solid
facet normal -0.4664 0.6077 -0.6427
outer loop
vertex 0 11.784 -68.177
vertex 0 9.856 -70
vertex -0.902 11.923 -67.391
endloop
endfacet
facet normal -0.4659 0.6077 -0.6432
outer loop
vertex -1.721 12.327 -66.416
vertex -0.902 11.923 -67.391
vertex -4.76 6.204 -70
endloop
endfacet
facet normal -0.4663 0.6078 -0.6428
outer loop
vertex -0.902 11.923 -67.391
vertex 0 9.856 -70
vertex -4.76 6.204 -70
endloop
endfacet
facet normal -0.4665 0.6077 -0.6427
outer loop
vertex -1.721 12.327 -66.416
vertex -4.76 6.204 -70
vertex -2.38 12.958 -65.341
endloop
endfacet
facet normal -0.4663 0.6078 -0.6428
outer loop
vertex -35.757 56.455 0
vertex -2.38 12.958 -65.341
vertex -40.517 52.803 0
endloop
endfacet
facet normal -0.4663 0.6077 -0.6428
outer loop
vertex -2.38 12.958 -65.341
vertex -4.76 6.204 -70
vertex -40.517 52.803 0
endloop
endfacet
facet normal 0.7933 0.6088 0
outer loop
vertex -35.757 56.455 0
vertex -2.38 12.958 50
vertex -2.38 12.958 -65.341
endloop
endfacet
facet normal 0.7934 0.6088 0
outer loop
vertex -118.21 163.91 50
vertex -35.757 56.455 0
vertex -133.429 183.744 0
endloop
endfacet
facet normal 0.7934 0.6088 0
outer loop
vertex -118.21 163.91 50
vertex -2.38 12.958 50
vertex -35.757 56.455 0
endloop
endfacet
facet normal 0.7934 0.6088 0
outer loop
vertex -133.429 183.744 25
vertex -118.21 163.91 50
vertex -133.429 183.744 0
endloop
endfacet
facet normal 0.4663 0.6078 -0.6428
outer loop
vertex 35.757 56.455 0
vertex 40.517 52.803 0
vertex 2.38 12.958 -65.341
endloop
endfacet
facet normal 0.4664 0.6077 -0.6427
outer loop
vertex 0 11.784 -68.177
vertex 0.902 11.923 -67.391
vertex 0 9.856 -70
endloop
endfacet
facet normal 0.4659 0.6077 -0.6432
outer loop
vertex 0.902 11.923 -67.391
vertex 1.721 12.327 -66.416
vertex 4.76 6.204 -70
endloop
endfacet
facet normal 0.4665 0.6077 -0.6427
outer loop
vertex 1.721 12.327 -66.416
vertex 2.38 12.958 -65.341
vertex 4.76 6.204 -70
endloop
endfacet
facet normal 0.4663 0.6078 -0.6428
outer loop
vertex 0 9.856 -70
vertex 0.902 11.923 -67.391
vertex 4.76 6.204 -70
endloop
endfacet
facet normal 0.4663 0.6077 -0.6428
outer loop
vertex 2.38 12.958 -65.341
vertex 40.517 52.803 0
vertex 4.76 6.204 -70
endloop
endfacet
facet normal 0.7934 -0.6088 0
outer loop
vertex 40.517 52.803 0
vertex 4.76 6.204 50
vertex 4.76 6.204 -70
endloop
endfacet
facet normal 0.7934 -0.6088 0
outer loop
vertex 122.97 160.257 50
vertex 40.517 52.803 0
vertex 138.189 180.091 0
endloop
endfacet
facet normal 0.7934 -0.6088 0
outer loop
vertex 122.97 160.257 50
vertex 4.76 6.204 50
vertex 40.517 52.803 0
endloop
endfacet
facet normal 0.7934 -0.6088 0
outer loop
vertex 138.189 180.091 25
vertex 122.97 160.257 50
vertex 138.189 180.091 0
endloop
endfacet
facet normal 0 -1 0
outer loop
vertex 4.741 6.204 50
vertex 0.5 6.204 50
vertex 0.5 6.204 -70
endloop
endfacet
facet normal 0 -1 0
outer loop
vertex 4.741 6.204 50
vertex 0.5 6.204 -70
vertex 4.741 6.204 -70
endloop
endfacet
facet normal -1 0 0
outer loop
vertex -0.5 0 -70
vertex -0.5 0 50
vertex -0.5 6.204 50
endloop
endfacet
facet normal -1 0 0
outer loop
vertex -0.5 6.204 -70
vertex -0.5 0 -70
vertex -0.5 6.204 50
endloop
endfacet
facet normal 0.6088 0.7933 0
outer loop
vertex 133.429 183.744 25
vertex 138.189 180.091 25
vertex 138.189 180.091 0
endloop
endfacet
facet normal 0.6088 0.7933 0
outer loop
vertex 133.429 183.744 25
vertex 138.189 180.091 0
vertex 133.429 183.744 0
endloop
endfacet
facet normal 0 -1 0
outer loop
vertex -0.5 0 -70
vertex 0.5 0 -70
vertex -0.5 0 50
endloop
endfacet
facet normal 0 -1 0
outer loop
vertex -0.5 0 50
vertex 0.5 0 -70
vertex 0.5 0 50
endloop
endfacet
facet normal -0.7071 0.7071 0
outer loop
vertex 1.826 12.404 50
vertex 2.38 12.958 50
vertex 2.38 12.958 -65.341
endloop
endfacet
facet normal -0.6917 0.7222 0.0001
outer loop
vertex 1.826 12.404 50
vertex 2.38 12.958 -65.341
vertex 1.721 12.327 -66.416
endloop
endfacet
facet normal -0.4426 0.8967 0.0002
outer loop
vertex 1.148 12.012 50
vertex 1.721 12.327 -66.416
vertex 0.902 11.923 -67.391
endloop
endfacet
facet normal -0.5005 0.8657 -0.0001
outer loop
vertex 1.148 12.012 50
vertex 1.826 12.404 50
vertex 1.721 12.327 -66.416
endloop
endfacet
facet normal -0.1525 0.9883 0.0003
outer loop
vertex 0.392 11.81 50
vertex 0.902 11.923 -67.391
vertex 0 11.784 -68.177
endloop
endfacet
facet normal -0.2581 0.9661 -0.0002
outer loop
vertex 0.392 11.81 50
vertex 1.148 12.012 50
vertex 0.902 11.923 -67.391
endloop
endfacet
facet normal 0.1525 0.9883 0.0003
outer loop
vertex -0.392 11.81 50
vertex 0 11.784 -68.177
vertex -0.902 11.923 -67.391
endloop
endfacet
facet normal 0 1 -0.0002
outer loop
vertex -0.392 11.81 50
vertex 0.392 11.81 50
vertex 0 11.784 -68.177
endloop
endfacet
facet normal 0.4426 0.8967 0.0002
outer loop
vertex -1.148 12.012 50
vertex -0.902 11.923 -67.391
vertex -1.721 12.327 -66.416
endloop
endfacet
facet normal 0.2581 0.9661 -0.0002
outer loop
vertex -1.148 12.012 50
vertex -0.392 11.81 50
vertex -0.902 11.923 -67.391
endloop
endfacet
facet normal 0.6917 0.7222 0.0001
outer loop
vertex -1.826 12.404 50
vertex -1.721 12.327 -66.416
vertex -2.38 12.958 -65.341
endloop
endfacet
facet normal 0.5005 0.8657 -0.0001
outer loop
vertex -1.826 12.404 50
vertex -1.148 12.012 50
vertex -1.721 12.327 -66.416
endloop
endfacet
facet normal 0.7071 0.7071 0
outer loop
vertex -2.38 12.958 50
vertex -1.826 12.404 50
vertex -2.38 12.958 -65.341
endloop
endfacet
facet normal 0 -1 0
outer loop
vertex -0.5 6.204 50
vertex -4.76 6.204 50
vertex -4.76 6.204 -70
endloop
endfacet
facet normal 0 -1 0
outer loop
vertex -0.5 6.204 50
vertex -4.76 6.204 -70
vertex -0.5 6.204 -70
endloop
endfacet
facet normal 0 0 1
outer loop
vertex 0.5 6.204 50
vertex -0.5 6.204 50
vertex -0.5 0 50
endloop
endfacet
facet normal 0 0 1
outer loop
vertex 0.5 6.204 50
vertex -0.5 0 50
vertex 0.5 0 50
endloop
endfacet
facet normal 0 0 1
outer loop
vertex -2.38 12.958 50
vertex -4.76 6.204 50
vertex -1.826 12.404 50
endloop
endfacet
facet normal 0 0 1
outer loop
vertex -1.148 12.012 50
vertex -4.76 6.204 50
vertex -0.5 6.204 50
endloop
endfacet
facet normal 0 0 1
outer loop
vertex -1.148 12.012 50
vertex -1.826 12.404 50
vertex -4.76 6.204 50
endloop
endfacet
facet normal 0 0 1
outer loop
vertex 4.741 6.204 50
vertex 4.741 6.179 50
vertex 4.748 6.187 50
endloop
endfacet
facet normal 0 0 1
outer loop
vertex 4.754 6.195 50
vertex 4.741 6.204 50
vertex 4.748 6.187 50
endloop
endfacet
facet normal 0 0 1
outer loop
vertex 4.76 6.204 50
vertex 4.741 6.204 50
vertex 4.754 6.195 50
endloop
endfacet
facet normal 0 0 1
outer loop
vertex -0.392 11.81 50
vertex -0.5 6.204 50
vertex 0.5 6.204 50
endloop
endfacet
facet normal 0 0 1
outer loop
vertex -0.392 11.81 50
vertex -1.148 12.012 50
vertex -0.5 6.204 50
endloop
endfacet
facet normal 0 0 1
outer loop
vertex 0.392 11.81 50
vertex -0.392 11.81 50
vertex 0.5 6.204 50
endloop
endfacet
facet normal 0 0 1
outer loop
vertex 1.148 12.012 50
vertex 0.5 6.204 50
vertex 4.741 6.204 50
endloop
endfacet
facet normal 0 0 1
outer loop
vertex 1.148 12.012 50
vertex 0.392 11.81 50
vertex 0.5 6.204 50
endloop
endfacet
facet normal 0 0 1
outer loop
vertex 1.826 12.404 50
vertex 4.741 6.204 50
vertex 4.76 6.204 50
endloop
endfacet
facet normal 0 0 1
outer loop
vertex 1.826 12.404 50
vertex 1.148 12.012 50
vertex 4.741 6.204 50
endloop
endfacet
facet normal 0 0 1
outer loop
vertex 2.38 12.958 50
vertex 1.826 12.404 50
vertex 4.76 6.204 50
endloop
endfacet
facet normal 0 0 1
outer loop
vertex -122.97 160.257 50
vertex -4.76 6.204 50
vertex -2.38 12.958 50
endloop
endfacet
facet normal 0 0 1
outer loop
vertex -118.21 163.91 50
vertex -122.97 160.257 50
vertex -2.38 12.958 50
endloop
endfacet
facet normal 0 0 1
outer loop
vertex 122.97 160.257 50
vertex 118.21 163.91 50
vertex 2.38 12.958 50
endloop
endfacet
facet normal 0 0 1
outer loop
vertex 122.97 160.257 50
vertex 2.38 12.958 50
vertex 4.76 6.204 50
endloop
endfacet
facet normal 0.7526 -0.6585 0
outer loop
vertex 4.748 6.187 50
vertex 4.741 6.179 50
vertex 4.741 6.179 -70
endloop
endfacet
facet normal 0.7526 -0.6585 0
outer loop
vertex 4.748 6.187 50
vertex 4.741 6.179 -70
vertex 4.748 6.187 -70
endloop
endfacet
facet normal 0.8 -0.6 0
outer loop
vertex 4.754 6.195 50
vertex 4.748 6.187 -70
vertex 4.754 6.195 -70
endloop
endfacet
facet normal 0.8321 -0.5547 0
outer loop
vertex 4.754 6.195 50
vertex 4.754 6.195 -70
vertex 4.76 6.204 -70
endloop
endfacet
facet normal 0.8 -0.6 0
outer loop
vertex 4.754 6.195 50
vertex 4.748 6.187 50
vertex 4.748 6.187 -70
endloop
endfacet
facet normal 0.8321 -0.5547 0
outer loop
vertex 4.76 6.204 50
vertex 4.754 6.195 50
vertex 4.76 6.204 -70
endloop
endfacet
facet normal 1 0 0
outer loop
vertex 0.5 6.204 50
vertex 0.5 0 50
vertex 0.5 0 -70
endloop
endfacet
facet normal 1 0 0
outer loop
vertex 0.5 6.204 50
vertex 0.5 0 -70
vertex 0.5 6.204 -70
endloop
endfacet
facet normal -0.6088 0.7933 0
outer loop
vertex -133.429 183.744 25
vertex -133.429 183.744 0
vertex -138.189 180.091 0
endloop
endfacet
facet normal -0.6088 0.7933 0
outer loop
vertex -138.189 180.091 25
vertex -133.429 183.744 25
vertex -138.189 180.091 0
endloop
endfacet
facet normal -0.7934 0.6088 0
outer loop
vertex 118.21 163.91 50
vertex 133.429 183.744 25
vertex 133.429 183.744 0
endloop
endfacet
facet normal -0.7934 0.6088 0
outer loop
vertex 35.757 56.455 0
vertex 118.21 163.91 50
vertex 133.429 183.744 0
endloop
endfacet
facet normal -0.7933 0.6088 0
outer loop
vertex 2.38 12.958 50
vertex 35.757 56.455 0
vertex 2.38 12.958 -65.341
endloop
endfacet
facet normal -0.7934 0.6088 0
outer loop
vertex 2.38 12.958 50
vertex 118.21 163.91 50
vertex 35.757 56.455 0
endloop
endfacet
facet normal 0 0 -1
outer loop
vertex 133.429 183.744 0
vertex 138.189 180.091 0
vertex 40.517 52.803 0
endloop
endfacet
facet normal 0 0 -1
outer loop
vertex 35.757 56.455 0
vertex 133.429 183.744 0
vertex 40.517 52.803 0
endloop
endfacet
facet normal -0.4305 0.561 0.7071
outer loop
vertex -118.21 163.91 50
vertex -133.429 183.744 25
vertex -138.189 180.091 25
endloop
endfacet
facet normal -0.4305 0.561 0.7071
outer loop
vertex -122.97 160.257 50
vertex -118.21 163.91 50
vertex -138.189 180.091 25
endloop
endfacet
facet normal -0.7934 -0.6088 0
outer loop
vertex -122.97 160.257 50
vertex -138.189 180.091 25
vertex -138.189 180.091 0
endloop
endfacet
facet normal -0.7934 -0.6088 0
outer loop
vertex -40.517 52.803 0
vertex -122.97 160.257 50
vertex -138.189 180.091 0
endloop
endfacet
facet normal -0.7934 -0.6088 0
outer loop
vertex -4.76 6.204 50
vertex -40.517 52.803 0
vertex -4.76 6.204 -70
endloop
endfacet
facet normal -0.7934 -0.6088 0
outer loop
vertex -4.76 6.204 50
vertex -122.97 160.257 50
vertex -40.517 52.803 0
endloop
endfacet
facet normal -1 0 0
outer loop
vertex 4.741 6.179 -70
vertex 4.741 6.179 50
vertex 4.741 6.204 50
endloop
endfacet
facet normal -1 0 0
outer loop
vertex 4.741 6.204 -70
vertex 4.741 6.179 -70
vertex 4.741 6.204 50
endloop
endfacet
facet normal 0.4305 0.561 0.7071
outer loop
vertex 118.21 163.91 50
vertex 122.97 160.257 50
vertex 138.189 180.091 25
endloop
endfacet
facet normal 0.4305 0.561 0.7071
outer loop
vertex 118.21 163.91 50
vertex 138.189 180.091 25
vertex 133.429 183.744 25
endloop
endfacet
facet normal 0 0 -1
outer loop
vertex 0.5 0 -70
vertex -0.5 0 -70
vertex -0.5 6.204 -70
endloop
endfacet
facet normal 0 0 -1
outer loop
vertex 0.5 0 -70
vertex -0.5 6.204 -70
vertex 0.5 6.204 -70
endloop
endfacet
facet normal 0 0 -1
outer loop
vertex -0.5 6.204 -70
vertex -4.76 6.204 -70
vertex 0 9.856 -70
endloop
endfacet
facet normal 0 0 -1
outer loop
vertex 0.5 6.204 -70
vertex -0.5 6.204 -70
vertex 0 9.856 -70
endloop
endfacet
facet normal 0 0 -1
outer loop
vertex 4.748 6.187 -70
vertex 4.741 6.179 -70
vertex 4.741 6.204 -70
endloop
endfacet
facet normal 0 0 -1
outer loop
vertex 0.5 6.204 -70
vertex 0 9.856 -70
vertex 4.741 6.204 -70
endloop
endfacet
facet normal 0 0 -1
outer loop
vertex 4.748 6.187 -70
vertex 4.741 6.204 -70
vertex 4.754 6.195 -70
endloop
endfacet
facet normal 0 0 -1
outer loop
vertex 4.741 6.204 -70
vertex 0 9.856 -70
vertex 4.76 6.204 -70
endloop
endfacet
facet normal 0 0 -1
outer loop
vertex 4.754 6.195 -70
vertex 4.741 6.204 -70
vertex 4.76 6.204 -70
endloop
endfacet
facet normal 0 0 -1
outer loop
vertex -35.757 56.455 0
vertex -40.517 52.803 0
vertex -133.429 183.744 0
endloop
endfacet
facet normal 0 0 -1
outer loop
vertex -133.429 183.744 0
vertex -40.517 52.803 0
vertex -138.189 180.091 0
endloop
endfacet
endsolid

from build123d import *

# Parameters (mm, degrees)
F1_DEPTH      = 50
F1_DEPTH_BACK = 70
F2_SIZE       = 25
F4_DEPTH      = 25
F6_DEPTH      = 25
F7_W          = 9.5013230816
F7_H          = 6.2035092162
F8_DEPTH      = 150
F8_DEPTH_BACK = 150
F9_W          = 6.2035092162
F9_H          = 120
F10_DEPTH     = 0.5


with BuildPart() as f1:
    # F0 (on Top) → F1 (new body, two sides)
    with BuildSketch(Plane.XY) as f1_sk:
        with BuildLine():
            Line((-133.4287243432, 183.7437768202), (-138.188844385, 180.0912082461))
            Line((-138.188844385, 180.0912082461), (-4.7601200417, 6.2035092162))
            ThreePointArc((-4.7601200417, 6.2035092162), (0, 3.8560777902), (4.7601200417, 6.2035092162))
            Line((4.7601200417, 6.2035092162), (138.188844385, 180.0912082461))
            Line((138.188844385, 180.0912082461), (133.4287243432, 183.7437768202))
            Line((133.4287243432, 183.7437768202), (2.3800600209, 12.9578323983))
            ThreePointArc((2.3800600209, 12.9578323983), (0, 11.7841166853), (-2.3800600209, 12.9578323983))
            Line((-2.3800600209, 12.9578323983), (-133.4287243432, 183.7437768202))
        make_face()
    extrude(amount=F1_DEPTH)
    extrude(f1_sk.sketch, amount=-F1_DEPTH_BACK)

    # F2
    f2_edges = [f1.edges().sort_by_distance(p)[0] for p in [
        (-135.808784, 181.917493, 50),
        (135.808784, 181.917493, 50),
    ]]
    chamfer(f2_edges, length=F2_SIZE)

    # F3 (on face) → F4 (cut)
    with BuildSketch(Plane(origin=(0, 0, 0), x_dir=(0.608761429, -0.7933533403, 0), z_dir=(-0.7933533403, -0.608761429, 0))):
        Polygon((-66.5563264195, 0), (-227, 0), (-227, -70), (-7.819352237, -70), align=None)
    extrude(amount=-F4_DEPTH, mode=Mode.SUBTRACT)

    # F5 (on face) → F6 (cut)
    with BuildSketch(Plane(origin=(0, 0, 0), x_dir=(0.608761429, 0.7933533403, 0), z_dir=(0.7933533403, -0.608761429, 0))):
        Polygon((66.5563264195, 0), (7.819352237, -70), (227, -70), (227, 0), align=None)
    extrude(amount=-F6_DEPTH, mode=Mode.SUBTRACT)

    # F7 (on Top) → F8 (cut, two sides)
    with BuildSketch(Plane.XY) as f8_sk:
        with Locations((-0.0094585009, 3.1017546081)):
            Rectangle(F7_W, F7_H)
    extrude(amount=F8_DEPTH, mode=Mode.SUBTRACT)
    extrude(f8_sk.sketch, amount=-F8_DEPTH_BACK, mode=Mode.SUBTRACT)

    # F9 (on Right) → F10 (join, symmetric)
    with BuildSketch(Plane.YZ):
        with Locations((3.1017546081, -10)):
            Rectangle(F9_W, F9_H)
    extrude(amount=F10_DEPTH, both=True)


solid = f1.part
